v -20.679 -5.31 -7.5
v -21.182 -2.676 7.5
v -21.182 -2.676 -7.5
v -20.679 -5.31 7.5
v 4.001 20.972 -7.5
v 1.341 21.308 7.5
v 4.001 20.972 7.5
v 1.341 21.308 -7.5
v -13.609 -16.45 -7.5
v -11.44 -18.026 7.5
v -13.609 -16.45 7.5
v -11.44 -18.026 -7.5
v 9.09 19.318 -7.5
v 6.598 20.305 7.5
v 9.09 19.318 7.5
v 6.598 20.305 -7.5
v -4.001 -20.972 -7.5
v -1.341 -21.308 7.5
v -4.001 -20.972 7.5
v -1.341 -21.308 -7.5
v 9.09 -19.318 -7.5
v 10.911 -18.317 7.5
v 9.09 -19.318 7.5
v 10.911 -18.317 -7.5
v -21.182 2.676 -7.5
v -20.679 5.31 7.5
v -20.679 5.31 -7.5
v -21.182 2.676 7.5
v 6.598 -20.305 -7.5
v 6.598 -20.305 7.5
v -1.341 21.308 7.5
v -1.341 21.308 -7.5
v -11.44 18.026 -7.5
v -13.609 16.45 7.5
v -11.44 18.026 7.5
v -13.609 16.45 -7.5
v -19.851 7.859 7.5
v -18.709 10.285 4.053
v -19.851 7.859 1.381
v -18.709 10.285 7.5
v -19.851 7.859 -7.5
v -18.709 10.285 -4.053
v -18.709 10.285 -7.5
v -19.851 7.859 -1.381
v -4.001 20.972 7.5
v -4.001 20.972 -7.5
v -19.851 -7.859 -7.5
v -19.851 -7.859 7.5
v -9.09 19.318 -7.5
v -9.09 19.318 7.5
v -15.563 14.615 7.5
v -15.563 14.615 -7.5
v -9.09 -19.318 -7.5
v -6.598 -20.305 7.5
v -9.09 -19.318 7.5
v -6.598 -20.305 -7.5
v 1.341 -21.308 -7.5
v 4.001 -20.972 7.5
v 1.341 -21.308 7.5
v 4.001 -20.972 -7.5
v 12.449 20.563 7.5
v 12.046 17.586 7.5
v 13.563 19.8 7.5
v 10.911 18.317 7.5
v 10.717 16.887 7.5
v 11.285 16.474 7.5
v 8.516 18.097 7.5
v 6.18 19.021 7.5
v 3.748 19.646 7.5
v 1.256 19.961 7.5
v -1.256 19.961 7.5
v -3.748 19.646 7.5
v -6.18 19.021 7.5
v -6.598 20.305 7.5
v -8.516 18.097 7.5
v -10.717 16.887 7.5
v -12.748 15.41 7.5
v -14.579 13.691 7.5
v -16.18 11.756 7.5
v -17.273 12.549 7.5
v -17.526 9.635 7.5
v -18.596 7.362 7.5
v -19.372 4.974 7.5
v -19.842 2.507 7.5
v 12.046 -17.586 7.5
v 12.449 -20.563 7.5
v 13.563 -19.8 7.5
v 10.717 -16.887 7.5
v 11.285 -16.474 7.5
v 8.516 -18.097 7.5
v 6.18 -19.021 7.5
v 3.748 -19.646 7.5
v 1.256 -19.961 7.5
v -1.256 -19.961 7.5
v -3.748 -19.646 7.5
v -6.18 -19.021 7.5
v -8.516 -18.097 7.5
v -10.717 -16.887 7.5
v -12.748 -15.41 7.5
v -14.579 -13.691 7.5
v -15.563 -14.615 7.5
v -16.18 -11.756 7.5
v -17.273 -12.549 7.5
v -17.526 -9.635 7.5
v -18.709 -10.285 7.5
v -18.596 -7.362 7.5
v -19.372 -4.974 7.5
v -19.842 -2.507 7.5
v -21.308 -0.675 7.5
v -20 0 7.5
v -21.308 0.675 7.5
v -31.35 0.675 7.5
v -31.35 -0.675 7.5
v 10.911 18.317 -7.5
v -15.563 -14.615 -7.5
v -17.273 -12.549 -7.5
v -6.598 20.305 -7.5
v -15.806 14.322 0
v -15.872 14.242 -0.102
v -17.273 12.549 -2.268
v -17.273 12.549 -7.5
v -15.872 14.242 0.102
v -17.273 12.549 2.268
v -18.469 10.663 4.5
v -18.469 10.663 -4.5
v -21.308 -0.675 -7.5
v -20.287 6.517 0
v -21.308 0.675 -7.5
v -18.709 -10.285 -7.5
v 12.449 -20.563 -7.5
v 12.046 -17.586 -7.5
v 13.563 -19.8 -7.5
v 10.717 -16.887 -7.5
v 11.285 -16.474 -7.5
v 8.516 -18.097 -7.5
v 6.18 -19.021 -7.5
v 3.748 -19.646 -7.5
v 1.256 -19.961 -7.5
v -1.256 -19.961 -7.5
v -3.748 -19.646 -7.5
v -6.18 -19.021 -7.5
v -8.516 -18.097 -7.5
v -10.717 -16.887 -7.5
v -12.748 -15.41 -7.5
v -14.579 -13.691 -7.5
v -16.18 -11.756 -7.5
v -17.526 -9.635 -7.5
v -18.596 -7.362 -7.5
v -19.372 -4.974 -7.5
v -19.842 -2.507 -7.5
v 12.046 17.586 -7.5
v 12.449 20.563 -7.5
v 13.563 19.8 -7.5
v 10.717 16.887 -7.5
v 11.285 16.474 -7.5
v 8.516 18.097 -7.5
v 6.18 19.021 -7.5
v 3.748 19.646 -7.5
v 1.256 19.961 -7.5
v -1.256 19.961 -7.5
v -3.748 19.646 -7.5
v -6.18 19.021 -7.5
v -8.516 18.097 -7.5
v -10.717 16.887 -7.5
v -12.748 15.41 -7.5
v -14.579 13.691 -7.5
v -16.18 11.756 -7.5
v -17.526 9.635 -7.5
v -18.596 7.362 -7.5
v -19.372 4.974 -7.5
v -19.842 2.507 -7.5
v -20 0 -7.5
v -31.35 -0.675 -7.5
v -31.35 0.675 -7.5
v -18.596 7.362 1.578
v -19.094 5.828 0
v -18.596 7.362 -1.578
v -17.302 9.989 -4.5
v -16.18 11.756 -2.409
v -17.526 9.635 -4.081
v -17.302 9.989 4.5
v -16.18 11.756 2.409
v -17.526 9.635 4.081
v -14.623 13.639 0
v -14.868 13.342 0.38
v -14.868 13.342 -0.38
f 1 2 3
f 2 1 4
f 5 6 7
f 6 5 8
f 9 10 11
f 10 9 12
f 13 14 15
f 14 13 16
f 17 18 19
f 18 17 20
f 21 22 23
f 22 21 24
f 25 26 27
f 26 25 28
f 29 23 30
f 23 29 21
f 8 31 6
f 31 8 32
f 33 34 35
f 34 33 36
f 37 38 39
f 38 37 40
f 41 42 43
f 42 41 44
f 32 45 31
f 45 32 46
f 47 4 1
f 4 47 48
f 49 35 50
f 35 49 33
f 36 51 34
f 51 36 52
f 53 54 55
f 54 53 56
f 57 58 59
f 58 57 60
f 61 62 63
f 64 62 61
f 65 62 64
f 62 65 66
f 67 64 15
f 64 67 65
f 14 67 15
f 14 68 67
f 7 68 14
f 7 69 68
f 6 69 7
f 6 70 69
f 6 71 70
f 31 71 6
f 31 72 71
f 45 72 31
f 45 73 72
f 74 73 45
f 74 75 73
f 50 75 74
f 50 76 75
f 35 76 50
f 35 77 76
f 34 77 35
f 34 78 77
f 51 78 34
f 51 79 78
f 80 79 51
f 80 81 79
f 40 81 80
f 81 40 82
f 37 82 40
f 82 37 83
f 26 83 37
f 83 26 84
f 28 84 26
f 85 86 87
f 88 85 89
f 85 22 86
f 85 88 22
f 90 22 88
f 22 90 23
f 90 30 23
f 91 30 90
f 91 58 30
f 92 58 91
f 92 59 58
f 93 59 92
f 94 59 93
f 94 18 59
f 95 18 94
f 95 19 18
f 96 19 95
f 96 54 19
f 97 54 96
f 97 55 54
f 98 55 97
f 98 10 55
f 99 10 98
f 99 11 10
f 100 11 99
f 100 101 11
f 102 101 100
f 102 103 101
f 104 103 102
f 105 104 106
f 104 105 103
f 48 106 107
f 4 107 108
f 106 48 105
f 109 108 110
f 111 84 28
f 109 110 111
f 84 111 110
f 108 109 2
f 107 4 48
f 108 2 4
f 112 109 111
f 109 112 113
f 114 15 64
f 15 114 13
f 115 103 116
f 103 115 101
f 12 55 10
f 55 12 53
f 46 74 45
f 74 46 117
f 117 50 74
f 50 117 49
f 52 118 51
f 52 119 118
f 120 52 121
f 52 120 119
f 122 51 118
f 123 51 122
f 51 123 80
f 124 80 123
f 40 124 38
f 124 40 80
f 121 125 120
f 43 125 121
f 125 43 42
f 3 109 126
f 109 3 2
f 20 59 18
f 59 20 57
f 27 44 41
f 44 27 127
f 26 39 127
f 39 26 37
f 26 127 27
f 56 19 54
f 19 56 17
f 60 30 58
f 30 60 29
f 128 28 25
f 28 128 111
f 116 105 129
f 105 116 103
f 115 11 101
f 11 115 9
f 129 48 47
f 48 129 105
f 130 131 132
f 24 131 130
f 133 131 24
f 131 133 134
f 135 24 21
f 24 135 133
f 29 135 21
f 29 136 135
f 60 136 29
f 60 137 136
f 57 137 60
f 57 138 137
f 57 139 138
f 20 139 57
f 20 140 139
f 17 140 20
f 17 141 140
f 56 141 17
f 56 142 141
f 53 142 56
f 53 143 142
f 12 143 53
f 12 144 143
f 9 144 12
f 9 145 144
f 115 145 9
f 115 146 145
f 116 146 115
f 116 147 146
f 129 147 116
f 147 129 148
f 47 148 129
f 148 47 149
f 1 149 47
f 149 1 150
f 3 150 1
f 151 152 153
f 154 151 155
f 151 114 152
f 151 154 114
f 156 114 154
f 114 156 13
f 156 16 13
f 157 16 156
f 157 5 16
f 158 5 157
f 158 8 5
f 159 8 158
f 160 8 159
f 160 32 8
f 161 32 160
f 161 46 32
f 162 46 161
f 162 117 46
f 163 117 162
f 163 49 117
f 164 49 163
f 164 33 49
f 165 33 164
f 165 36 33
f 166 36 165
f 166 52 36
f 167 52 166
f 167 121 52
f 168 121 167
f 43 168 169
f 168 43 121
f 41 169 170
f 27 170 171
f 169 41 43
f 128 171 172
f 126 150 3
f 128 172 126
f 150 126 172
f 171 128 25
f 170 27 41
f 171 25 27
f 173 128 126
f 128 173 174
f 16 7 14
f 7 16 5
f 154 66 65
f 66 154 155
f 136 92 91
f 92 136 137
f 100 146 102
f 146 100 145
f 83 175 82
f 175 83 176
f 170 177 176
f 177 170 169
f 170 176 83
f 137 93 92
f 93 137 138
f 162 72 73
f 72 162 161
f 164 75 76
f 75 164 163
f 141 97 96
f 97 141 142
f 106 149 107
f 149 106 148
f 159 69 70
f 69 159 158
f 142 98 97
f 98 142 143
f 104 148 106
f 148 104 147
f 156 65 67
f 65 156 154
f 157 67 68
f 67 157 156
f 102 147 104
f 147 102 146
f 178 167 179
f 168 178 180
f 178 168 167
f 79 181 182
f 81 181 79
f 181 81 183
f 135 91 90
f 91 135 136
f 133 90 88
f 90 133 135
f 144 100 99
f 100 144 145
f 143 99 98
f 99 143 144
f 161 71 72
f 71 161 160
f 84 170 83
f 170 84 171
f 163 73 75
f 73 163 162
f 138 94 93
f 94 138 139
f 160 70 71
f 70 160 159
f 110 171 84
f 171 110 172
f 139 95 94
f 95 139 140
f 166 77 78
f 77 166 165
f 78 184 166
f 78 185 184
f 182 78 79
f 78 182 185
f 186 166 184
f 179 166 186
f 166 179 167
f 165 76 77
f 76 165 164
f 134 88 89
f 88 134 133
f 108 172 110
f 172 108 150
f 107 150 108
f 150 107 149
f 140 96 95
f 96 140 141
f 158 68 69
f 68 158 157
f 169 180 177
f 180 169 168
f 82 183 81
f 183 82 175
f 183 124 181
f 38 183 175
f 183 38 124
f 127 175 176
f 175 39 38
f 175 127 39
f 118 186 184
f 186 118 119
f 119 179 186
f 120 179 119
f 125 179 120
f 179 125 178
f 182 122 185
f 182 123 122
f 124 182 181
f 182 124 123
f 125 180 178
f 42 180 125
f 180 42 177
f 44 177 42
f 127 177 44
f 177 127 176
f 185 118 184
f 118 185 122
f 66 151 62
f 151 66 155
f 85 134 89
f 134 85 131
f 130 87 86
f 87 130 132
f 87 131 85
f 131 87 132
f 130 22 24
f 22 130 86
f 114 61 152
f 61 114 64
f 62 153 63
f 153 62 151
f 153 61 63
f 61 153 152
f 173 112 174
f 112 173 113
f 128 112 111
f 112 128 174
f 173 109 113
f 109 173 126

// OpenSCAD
/*
 * Wire Spool Clamp (Parametric), v0.42
 *
 * by Alex Franke (CodeCreations), Jan 2013
 * http://www.theFrankes.com
 * 
 * Licenced under Creative Commons Attribution - Non-Commercial - Share Alike 3.0 
 * 
 * DESCRIPTION: This will help keep spooled wire in its place. 
 * 
 * INSTRUCTIONS: Choose some values in the "User-defined values" section if 
 *   necessary, render, and print. The default values fit a typical wire spool 
 *   found at Radio Shack. 
 * 
 * v0.42, Jan 30, 2013: Initial Release.
 * 
 * TODO: 
 *   * None at this time
 */

/////////////////////////////////////////////////////////////////////////////
// User-defined values... 
/////////////////////////////////////////////////////////////////////////////

// The width of the spool clip.
width = 15;

// The inner diameter of the clip. (Go a bit small here because it bends open.)
diameter = 40;

// The thickness of the printed material. (Fine tune it for your printer.)
thickness = 1.35;

// The length of the tab/handle.
tabLength = 10; 

// The size of the opening at the back of the clip (not the window).
opening = 33; 

// The length of the guides on both sides of the back. 
guideLength = 4; 

// The amount of material on either side of the window. 
windowMargin = 3; 

// The angle position of the window.
windowAngle = 30; 

// General curve quality 
$fn = 50; 


/////////////////////////////////////////////////////////////////////////////
// The code... 
/////////////////////////////////////////////////////////////////////////////

angle = asin(opening/diameter);

union() {
	rodClamp( diameter, thickness, width, opening ); 

	for(y=[-1,1]) {
		rotate([0,0,angle*y])	
			translate([guideLength/2+diameter/2,thickness/2*y,0]) 
				cube([guideLength, thickness, width], center=true);
	}

	// tab
	translate([-(tabLength+diameter+thickness)/2,0,0]) 
	cube([tabLength+thickness,thickness,width], center=true);

}

// taken from my snapconnector.scad and then modified quite a bit... 
module rodClamp(rodDiameter=8, thickness=2, length=8, opening=6) {
	angle = asin(opening/rodDiameter);
	h = rodDiameter/2+thickness+1;
	x = cos(angle)*h; 
	y = sin(angle)*h;
	x2 = h/cos(angle);
	windowSide = (length/2-windowMargin)/cos(45);

	difference() {
		cylinder(h=length, r=rodDiameter/2 + thickness, center=true);
		cylinder(h=length+1, r=rodDiameter/2, center=true);

		rotate([0,0,-windowAngle]) 
			translate([-(rodDiameter/2+thickness)/2,0,0]) 
				rotate([45,0,0]) 
					cube([rodDiameter/2+thickness, windowSide, windowSide], center=true);
		
		linear_extrude(height=length+1, center=true) 
			polygon(points=[[0,0],[x,y],[x2,0],[x,-y]]);
	}
}
